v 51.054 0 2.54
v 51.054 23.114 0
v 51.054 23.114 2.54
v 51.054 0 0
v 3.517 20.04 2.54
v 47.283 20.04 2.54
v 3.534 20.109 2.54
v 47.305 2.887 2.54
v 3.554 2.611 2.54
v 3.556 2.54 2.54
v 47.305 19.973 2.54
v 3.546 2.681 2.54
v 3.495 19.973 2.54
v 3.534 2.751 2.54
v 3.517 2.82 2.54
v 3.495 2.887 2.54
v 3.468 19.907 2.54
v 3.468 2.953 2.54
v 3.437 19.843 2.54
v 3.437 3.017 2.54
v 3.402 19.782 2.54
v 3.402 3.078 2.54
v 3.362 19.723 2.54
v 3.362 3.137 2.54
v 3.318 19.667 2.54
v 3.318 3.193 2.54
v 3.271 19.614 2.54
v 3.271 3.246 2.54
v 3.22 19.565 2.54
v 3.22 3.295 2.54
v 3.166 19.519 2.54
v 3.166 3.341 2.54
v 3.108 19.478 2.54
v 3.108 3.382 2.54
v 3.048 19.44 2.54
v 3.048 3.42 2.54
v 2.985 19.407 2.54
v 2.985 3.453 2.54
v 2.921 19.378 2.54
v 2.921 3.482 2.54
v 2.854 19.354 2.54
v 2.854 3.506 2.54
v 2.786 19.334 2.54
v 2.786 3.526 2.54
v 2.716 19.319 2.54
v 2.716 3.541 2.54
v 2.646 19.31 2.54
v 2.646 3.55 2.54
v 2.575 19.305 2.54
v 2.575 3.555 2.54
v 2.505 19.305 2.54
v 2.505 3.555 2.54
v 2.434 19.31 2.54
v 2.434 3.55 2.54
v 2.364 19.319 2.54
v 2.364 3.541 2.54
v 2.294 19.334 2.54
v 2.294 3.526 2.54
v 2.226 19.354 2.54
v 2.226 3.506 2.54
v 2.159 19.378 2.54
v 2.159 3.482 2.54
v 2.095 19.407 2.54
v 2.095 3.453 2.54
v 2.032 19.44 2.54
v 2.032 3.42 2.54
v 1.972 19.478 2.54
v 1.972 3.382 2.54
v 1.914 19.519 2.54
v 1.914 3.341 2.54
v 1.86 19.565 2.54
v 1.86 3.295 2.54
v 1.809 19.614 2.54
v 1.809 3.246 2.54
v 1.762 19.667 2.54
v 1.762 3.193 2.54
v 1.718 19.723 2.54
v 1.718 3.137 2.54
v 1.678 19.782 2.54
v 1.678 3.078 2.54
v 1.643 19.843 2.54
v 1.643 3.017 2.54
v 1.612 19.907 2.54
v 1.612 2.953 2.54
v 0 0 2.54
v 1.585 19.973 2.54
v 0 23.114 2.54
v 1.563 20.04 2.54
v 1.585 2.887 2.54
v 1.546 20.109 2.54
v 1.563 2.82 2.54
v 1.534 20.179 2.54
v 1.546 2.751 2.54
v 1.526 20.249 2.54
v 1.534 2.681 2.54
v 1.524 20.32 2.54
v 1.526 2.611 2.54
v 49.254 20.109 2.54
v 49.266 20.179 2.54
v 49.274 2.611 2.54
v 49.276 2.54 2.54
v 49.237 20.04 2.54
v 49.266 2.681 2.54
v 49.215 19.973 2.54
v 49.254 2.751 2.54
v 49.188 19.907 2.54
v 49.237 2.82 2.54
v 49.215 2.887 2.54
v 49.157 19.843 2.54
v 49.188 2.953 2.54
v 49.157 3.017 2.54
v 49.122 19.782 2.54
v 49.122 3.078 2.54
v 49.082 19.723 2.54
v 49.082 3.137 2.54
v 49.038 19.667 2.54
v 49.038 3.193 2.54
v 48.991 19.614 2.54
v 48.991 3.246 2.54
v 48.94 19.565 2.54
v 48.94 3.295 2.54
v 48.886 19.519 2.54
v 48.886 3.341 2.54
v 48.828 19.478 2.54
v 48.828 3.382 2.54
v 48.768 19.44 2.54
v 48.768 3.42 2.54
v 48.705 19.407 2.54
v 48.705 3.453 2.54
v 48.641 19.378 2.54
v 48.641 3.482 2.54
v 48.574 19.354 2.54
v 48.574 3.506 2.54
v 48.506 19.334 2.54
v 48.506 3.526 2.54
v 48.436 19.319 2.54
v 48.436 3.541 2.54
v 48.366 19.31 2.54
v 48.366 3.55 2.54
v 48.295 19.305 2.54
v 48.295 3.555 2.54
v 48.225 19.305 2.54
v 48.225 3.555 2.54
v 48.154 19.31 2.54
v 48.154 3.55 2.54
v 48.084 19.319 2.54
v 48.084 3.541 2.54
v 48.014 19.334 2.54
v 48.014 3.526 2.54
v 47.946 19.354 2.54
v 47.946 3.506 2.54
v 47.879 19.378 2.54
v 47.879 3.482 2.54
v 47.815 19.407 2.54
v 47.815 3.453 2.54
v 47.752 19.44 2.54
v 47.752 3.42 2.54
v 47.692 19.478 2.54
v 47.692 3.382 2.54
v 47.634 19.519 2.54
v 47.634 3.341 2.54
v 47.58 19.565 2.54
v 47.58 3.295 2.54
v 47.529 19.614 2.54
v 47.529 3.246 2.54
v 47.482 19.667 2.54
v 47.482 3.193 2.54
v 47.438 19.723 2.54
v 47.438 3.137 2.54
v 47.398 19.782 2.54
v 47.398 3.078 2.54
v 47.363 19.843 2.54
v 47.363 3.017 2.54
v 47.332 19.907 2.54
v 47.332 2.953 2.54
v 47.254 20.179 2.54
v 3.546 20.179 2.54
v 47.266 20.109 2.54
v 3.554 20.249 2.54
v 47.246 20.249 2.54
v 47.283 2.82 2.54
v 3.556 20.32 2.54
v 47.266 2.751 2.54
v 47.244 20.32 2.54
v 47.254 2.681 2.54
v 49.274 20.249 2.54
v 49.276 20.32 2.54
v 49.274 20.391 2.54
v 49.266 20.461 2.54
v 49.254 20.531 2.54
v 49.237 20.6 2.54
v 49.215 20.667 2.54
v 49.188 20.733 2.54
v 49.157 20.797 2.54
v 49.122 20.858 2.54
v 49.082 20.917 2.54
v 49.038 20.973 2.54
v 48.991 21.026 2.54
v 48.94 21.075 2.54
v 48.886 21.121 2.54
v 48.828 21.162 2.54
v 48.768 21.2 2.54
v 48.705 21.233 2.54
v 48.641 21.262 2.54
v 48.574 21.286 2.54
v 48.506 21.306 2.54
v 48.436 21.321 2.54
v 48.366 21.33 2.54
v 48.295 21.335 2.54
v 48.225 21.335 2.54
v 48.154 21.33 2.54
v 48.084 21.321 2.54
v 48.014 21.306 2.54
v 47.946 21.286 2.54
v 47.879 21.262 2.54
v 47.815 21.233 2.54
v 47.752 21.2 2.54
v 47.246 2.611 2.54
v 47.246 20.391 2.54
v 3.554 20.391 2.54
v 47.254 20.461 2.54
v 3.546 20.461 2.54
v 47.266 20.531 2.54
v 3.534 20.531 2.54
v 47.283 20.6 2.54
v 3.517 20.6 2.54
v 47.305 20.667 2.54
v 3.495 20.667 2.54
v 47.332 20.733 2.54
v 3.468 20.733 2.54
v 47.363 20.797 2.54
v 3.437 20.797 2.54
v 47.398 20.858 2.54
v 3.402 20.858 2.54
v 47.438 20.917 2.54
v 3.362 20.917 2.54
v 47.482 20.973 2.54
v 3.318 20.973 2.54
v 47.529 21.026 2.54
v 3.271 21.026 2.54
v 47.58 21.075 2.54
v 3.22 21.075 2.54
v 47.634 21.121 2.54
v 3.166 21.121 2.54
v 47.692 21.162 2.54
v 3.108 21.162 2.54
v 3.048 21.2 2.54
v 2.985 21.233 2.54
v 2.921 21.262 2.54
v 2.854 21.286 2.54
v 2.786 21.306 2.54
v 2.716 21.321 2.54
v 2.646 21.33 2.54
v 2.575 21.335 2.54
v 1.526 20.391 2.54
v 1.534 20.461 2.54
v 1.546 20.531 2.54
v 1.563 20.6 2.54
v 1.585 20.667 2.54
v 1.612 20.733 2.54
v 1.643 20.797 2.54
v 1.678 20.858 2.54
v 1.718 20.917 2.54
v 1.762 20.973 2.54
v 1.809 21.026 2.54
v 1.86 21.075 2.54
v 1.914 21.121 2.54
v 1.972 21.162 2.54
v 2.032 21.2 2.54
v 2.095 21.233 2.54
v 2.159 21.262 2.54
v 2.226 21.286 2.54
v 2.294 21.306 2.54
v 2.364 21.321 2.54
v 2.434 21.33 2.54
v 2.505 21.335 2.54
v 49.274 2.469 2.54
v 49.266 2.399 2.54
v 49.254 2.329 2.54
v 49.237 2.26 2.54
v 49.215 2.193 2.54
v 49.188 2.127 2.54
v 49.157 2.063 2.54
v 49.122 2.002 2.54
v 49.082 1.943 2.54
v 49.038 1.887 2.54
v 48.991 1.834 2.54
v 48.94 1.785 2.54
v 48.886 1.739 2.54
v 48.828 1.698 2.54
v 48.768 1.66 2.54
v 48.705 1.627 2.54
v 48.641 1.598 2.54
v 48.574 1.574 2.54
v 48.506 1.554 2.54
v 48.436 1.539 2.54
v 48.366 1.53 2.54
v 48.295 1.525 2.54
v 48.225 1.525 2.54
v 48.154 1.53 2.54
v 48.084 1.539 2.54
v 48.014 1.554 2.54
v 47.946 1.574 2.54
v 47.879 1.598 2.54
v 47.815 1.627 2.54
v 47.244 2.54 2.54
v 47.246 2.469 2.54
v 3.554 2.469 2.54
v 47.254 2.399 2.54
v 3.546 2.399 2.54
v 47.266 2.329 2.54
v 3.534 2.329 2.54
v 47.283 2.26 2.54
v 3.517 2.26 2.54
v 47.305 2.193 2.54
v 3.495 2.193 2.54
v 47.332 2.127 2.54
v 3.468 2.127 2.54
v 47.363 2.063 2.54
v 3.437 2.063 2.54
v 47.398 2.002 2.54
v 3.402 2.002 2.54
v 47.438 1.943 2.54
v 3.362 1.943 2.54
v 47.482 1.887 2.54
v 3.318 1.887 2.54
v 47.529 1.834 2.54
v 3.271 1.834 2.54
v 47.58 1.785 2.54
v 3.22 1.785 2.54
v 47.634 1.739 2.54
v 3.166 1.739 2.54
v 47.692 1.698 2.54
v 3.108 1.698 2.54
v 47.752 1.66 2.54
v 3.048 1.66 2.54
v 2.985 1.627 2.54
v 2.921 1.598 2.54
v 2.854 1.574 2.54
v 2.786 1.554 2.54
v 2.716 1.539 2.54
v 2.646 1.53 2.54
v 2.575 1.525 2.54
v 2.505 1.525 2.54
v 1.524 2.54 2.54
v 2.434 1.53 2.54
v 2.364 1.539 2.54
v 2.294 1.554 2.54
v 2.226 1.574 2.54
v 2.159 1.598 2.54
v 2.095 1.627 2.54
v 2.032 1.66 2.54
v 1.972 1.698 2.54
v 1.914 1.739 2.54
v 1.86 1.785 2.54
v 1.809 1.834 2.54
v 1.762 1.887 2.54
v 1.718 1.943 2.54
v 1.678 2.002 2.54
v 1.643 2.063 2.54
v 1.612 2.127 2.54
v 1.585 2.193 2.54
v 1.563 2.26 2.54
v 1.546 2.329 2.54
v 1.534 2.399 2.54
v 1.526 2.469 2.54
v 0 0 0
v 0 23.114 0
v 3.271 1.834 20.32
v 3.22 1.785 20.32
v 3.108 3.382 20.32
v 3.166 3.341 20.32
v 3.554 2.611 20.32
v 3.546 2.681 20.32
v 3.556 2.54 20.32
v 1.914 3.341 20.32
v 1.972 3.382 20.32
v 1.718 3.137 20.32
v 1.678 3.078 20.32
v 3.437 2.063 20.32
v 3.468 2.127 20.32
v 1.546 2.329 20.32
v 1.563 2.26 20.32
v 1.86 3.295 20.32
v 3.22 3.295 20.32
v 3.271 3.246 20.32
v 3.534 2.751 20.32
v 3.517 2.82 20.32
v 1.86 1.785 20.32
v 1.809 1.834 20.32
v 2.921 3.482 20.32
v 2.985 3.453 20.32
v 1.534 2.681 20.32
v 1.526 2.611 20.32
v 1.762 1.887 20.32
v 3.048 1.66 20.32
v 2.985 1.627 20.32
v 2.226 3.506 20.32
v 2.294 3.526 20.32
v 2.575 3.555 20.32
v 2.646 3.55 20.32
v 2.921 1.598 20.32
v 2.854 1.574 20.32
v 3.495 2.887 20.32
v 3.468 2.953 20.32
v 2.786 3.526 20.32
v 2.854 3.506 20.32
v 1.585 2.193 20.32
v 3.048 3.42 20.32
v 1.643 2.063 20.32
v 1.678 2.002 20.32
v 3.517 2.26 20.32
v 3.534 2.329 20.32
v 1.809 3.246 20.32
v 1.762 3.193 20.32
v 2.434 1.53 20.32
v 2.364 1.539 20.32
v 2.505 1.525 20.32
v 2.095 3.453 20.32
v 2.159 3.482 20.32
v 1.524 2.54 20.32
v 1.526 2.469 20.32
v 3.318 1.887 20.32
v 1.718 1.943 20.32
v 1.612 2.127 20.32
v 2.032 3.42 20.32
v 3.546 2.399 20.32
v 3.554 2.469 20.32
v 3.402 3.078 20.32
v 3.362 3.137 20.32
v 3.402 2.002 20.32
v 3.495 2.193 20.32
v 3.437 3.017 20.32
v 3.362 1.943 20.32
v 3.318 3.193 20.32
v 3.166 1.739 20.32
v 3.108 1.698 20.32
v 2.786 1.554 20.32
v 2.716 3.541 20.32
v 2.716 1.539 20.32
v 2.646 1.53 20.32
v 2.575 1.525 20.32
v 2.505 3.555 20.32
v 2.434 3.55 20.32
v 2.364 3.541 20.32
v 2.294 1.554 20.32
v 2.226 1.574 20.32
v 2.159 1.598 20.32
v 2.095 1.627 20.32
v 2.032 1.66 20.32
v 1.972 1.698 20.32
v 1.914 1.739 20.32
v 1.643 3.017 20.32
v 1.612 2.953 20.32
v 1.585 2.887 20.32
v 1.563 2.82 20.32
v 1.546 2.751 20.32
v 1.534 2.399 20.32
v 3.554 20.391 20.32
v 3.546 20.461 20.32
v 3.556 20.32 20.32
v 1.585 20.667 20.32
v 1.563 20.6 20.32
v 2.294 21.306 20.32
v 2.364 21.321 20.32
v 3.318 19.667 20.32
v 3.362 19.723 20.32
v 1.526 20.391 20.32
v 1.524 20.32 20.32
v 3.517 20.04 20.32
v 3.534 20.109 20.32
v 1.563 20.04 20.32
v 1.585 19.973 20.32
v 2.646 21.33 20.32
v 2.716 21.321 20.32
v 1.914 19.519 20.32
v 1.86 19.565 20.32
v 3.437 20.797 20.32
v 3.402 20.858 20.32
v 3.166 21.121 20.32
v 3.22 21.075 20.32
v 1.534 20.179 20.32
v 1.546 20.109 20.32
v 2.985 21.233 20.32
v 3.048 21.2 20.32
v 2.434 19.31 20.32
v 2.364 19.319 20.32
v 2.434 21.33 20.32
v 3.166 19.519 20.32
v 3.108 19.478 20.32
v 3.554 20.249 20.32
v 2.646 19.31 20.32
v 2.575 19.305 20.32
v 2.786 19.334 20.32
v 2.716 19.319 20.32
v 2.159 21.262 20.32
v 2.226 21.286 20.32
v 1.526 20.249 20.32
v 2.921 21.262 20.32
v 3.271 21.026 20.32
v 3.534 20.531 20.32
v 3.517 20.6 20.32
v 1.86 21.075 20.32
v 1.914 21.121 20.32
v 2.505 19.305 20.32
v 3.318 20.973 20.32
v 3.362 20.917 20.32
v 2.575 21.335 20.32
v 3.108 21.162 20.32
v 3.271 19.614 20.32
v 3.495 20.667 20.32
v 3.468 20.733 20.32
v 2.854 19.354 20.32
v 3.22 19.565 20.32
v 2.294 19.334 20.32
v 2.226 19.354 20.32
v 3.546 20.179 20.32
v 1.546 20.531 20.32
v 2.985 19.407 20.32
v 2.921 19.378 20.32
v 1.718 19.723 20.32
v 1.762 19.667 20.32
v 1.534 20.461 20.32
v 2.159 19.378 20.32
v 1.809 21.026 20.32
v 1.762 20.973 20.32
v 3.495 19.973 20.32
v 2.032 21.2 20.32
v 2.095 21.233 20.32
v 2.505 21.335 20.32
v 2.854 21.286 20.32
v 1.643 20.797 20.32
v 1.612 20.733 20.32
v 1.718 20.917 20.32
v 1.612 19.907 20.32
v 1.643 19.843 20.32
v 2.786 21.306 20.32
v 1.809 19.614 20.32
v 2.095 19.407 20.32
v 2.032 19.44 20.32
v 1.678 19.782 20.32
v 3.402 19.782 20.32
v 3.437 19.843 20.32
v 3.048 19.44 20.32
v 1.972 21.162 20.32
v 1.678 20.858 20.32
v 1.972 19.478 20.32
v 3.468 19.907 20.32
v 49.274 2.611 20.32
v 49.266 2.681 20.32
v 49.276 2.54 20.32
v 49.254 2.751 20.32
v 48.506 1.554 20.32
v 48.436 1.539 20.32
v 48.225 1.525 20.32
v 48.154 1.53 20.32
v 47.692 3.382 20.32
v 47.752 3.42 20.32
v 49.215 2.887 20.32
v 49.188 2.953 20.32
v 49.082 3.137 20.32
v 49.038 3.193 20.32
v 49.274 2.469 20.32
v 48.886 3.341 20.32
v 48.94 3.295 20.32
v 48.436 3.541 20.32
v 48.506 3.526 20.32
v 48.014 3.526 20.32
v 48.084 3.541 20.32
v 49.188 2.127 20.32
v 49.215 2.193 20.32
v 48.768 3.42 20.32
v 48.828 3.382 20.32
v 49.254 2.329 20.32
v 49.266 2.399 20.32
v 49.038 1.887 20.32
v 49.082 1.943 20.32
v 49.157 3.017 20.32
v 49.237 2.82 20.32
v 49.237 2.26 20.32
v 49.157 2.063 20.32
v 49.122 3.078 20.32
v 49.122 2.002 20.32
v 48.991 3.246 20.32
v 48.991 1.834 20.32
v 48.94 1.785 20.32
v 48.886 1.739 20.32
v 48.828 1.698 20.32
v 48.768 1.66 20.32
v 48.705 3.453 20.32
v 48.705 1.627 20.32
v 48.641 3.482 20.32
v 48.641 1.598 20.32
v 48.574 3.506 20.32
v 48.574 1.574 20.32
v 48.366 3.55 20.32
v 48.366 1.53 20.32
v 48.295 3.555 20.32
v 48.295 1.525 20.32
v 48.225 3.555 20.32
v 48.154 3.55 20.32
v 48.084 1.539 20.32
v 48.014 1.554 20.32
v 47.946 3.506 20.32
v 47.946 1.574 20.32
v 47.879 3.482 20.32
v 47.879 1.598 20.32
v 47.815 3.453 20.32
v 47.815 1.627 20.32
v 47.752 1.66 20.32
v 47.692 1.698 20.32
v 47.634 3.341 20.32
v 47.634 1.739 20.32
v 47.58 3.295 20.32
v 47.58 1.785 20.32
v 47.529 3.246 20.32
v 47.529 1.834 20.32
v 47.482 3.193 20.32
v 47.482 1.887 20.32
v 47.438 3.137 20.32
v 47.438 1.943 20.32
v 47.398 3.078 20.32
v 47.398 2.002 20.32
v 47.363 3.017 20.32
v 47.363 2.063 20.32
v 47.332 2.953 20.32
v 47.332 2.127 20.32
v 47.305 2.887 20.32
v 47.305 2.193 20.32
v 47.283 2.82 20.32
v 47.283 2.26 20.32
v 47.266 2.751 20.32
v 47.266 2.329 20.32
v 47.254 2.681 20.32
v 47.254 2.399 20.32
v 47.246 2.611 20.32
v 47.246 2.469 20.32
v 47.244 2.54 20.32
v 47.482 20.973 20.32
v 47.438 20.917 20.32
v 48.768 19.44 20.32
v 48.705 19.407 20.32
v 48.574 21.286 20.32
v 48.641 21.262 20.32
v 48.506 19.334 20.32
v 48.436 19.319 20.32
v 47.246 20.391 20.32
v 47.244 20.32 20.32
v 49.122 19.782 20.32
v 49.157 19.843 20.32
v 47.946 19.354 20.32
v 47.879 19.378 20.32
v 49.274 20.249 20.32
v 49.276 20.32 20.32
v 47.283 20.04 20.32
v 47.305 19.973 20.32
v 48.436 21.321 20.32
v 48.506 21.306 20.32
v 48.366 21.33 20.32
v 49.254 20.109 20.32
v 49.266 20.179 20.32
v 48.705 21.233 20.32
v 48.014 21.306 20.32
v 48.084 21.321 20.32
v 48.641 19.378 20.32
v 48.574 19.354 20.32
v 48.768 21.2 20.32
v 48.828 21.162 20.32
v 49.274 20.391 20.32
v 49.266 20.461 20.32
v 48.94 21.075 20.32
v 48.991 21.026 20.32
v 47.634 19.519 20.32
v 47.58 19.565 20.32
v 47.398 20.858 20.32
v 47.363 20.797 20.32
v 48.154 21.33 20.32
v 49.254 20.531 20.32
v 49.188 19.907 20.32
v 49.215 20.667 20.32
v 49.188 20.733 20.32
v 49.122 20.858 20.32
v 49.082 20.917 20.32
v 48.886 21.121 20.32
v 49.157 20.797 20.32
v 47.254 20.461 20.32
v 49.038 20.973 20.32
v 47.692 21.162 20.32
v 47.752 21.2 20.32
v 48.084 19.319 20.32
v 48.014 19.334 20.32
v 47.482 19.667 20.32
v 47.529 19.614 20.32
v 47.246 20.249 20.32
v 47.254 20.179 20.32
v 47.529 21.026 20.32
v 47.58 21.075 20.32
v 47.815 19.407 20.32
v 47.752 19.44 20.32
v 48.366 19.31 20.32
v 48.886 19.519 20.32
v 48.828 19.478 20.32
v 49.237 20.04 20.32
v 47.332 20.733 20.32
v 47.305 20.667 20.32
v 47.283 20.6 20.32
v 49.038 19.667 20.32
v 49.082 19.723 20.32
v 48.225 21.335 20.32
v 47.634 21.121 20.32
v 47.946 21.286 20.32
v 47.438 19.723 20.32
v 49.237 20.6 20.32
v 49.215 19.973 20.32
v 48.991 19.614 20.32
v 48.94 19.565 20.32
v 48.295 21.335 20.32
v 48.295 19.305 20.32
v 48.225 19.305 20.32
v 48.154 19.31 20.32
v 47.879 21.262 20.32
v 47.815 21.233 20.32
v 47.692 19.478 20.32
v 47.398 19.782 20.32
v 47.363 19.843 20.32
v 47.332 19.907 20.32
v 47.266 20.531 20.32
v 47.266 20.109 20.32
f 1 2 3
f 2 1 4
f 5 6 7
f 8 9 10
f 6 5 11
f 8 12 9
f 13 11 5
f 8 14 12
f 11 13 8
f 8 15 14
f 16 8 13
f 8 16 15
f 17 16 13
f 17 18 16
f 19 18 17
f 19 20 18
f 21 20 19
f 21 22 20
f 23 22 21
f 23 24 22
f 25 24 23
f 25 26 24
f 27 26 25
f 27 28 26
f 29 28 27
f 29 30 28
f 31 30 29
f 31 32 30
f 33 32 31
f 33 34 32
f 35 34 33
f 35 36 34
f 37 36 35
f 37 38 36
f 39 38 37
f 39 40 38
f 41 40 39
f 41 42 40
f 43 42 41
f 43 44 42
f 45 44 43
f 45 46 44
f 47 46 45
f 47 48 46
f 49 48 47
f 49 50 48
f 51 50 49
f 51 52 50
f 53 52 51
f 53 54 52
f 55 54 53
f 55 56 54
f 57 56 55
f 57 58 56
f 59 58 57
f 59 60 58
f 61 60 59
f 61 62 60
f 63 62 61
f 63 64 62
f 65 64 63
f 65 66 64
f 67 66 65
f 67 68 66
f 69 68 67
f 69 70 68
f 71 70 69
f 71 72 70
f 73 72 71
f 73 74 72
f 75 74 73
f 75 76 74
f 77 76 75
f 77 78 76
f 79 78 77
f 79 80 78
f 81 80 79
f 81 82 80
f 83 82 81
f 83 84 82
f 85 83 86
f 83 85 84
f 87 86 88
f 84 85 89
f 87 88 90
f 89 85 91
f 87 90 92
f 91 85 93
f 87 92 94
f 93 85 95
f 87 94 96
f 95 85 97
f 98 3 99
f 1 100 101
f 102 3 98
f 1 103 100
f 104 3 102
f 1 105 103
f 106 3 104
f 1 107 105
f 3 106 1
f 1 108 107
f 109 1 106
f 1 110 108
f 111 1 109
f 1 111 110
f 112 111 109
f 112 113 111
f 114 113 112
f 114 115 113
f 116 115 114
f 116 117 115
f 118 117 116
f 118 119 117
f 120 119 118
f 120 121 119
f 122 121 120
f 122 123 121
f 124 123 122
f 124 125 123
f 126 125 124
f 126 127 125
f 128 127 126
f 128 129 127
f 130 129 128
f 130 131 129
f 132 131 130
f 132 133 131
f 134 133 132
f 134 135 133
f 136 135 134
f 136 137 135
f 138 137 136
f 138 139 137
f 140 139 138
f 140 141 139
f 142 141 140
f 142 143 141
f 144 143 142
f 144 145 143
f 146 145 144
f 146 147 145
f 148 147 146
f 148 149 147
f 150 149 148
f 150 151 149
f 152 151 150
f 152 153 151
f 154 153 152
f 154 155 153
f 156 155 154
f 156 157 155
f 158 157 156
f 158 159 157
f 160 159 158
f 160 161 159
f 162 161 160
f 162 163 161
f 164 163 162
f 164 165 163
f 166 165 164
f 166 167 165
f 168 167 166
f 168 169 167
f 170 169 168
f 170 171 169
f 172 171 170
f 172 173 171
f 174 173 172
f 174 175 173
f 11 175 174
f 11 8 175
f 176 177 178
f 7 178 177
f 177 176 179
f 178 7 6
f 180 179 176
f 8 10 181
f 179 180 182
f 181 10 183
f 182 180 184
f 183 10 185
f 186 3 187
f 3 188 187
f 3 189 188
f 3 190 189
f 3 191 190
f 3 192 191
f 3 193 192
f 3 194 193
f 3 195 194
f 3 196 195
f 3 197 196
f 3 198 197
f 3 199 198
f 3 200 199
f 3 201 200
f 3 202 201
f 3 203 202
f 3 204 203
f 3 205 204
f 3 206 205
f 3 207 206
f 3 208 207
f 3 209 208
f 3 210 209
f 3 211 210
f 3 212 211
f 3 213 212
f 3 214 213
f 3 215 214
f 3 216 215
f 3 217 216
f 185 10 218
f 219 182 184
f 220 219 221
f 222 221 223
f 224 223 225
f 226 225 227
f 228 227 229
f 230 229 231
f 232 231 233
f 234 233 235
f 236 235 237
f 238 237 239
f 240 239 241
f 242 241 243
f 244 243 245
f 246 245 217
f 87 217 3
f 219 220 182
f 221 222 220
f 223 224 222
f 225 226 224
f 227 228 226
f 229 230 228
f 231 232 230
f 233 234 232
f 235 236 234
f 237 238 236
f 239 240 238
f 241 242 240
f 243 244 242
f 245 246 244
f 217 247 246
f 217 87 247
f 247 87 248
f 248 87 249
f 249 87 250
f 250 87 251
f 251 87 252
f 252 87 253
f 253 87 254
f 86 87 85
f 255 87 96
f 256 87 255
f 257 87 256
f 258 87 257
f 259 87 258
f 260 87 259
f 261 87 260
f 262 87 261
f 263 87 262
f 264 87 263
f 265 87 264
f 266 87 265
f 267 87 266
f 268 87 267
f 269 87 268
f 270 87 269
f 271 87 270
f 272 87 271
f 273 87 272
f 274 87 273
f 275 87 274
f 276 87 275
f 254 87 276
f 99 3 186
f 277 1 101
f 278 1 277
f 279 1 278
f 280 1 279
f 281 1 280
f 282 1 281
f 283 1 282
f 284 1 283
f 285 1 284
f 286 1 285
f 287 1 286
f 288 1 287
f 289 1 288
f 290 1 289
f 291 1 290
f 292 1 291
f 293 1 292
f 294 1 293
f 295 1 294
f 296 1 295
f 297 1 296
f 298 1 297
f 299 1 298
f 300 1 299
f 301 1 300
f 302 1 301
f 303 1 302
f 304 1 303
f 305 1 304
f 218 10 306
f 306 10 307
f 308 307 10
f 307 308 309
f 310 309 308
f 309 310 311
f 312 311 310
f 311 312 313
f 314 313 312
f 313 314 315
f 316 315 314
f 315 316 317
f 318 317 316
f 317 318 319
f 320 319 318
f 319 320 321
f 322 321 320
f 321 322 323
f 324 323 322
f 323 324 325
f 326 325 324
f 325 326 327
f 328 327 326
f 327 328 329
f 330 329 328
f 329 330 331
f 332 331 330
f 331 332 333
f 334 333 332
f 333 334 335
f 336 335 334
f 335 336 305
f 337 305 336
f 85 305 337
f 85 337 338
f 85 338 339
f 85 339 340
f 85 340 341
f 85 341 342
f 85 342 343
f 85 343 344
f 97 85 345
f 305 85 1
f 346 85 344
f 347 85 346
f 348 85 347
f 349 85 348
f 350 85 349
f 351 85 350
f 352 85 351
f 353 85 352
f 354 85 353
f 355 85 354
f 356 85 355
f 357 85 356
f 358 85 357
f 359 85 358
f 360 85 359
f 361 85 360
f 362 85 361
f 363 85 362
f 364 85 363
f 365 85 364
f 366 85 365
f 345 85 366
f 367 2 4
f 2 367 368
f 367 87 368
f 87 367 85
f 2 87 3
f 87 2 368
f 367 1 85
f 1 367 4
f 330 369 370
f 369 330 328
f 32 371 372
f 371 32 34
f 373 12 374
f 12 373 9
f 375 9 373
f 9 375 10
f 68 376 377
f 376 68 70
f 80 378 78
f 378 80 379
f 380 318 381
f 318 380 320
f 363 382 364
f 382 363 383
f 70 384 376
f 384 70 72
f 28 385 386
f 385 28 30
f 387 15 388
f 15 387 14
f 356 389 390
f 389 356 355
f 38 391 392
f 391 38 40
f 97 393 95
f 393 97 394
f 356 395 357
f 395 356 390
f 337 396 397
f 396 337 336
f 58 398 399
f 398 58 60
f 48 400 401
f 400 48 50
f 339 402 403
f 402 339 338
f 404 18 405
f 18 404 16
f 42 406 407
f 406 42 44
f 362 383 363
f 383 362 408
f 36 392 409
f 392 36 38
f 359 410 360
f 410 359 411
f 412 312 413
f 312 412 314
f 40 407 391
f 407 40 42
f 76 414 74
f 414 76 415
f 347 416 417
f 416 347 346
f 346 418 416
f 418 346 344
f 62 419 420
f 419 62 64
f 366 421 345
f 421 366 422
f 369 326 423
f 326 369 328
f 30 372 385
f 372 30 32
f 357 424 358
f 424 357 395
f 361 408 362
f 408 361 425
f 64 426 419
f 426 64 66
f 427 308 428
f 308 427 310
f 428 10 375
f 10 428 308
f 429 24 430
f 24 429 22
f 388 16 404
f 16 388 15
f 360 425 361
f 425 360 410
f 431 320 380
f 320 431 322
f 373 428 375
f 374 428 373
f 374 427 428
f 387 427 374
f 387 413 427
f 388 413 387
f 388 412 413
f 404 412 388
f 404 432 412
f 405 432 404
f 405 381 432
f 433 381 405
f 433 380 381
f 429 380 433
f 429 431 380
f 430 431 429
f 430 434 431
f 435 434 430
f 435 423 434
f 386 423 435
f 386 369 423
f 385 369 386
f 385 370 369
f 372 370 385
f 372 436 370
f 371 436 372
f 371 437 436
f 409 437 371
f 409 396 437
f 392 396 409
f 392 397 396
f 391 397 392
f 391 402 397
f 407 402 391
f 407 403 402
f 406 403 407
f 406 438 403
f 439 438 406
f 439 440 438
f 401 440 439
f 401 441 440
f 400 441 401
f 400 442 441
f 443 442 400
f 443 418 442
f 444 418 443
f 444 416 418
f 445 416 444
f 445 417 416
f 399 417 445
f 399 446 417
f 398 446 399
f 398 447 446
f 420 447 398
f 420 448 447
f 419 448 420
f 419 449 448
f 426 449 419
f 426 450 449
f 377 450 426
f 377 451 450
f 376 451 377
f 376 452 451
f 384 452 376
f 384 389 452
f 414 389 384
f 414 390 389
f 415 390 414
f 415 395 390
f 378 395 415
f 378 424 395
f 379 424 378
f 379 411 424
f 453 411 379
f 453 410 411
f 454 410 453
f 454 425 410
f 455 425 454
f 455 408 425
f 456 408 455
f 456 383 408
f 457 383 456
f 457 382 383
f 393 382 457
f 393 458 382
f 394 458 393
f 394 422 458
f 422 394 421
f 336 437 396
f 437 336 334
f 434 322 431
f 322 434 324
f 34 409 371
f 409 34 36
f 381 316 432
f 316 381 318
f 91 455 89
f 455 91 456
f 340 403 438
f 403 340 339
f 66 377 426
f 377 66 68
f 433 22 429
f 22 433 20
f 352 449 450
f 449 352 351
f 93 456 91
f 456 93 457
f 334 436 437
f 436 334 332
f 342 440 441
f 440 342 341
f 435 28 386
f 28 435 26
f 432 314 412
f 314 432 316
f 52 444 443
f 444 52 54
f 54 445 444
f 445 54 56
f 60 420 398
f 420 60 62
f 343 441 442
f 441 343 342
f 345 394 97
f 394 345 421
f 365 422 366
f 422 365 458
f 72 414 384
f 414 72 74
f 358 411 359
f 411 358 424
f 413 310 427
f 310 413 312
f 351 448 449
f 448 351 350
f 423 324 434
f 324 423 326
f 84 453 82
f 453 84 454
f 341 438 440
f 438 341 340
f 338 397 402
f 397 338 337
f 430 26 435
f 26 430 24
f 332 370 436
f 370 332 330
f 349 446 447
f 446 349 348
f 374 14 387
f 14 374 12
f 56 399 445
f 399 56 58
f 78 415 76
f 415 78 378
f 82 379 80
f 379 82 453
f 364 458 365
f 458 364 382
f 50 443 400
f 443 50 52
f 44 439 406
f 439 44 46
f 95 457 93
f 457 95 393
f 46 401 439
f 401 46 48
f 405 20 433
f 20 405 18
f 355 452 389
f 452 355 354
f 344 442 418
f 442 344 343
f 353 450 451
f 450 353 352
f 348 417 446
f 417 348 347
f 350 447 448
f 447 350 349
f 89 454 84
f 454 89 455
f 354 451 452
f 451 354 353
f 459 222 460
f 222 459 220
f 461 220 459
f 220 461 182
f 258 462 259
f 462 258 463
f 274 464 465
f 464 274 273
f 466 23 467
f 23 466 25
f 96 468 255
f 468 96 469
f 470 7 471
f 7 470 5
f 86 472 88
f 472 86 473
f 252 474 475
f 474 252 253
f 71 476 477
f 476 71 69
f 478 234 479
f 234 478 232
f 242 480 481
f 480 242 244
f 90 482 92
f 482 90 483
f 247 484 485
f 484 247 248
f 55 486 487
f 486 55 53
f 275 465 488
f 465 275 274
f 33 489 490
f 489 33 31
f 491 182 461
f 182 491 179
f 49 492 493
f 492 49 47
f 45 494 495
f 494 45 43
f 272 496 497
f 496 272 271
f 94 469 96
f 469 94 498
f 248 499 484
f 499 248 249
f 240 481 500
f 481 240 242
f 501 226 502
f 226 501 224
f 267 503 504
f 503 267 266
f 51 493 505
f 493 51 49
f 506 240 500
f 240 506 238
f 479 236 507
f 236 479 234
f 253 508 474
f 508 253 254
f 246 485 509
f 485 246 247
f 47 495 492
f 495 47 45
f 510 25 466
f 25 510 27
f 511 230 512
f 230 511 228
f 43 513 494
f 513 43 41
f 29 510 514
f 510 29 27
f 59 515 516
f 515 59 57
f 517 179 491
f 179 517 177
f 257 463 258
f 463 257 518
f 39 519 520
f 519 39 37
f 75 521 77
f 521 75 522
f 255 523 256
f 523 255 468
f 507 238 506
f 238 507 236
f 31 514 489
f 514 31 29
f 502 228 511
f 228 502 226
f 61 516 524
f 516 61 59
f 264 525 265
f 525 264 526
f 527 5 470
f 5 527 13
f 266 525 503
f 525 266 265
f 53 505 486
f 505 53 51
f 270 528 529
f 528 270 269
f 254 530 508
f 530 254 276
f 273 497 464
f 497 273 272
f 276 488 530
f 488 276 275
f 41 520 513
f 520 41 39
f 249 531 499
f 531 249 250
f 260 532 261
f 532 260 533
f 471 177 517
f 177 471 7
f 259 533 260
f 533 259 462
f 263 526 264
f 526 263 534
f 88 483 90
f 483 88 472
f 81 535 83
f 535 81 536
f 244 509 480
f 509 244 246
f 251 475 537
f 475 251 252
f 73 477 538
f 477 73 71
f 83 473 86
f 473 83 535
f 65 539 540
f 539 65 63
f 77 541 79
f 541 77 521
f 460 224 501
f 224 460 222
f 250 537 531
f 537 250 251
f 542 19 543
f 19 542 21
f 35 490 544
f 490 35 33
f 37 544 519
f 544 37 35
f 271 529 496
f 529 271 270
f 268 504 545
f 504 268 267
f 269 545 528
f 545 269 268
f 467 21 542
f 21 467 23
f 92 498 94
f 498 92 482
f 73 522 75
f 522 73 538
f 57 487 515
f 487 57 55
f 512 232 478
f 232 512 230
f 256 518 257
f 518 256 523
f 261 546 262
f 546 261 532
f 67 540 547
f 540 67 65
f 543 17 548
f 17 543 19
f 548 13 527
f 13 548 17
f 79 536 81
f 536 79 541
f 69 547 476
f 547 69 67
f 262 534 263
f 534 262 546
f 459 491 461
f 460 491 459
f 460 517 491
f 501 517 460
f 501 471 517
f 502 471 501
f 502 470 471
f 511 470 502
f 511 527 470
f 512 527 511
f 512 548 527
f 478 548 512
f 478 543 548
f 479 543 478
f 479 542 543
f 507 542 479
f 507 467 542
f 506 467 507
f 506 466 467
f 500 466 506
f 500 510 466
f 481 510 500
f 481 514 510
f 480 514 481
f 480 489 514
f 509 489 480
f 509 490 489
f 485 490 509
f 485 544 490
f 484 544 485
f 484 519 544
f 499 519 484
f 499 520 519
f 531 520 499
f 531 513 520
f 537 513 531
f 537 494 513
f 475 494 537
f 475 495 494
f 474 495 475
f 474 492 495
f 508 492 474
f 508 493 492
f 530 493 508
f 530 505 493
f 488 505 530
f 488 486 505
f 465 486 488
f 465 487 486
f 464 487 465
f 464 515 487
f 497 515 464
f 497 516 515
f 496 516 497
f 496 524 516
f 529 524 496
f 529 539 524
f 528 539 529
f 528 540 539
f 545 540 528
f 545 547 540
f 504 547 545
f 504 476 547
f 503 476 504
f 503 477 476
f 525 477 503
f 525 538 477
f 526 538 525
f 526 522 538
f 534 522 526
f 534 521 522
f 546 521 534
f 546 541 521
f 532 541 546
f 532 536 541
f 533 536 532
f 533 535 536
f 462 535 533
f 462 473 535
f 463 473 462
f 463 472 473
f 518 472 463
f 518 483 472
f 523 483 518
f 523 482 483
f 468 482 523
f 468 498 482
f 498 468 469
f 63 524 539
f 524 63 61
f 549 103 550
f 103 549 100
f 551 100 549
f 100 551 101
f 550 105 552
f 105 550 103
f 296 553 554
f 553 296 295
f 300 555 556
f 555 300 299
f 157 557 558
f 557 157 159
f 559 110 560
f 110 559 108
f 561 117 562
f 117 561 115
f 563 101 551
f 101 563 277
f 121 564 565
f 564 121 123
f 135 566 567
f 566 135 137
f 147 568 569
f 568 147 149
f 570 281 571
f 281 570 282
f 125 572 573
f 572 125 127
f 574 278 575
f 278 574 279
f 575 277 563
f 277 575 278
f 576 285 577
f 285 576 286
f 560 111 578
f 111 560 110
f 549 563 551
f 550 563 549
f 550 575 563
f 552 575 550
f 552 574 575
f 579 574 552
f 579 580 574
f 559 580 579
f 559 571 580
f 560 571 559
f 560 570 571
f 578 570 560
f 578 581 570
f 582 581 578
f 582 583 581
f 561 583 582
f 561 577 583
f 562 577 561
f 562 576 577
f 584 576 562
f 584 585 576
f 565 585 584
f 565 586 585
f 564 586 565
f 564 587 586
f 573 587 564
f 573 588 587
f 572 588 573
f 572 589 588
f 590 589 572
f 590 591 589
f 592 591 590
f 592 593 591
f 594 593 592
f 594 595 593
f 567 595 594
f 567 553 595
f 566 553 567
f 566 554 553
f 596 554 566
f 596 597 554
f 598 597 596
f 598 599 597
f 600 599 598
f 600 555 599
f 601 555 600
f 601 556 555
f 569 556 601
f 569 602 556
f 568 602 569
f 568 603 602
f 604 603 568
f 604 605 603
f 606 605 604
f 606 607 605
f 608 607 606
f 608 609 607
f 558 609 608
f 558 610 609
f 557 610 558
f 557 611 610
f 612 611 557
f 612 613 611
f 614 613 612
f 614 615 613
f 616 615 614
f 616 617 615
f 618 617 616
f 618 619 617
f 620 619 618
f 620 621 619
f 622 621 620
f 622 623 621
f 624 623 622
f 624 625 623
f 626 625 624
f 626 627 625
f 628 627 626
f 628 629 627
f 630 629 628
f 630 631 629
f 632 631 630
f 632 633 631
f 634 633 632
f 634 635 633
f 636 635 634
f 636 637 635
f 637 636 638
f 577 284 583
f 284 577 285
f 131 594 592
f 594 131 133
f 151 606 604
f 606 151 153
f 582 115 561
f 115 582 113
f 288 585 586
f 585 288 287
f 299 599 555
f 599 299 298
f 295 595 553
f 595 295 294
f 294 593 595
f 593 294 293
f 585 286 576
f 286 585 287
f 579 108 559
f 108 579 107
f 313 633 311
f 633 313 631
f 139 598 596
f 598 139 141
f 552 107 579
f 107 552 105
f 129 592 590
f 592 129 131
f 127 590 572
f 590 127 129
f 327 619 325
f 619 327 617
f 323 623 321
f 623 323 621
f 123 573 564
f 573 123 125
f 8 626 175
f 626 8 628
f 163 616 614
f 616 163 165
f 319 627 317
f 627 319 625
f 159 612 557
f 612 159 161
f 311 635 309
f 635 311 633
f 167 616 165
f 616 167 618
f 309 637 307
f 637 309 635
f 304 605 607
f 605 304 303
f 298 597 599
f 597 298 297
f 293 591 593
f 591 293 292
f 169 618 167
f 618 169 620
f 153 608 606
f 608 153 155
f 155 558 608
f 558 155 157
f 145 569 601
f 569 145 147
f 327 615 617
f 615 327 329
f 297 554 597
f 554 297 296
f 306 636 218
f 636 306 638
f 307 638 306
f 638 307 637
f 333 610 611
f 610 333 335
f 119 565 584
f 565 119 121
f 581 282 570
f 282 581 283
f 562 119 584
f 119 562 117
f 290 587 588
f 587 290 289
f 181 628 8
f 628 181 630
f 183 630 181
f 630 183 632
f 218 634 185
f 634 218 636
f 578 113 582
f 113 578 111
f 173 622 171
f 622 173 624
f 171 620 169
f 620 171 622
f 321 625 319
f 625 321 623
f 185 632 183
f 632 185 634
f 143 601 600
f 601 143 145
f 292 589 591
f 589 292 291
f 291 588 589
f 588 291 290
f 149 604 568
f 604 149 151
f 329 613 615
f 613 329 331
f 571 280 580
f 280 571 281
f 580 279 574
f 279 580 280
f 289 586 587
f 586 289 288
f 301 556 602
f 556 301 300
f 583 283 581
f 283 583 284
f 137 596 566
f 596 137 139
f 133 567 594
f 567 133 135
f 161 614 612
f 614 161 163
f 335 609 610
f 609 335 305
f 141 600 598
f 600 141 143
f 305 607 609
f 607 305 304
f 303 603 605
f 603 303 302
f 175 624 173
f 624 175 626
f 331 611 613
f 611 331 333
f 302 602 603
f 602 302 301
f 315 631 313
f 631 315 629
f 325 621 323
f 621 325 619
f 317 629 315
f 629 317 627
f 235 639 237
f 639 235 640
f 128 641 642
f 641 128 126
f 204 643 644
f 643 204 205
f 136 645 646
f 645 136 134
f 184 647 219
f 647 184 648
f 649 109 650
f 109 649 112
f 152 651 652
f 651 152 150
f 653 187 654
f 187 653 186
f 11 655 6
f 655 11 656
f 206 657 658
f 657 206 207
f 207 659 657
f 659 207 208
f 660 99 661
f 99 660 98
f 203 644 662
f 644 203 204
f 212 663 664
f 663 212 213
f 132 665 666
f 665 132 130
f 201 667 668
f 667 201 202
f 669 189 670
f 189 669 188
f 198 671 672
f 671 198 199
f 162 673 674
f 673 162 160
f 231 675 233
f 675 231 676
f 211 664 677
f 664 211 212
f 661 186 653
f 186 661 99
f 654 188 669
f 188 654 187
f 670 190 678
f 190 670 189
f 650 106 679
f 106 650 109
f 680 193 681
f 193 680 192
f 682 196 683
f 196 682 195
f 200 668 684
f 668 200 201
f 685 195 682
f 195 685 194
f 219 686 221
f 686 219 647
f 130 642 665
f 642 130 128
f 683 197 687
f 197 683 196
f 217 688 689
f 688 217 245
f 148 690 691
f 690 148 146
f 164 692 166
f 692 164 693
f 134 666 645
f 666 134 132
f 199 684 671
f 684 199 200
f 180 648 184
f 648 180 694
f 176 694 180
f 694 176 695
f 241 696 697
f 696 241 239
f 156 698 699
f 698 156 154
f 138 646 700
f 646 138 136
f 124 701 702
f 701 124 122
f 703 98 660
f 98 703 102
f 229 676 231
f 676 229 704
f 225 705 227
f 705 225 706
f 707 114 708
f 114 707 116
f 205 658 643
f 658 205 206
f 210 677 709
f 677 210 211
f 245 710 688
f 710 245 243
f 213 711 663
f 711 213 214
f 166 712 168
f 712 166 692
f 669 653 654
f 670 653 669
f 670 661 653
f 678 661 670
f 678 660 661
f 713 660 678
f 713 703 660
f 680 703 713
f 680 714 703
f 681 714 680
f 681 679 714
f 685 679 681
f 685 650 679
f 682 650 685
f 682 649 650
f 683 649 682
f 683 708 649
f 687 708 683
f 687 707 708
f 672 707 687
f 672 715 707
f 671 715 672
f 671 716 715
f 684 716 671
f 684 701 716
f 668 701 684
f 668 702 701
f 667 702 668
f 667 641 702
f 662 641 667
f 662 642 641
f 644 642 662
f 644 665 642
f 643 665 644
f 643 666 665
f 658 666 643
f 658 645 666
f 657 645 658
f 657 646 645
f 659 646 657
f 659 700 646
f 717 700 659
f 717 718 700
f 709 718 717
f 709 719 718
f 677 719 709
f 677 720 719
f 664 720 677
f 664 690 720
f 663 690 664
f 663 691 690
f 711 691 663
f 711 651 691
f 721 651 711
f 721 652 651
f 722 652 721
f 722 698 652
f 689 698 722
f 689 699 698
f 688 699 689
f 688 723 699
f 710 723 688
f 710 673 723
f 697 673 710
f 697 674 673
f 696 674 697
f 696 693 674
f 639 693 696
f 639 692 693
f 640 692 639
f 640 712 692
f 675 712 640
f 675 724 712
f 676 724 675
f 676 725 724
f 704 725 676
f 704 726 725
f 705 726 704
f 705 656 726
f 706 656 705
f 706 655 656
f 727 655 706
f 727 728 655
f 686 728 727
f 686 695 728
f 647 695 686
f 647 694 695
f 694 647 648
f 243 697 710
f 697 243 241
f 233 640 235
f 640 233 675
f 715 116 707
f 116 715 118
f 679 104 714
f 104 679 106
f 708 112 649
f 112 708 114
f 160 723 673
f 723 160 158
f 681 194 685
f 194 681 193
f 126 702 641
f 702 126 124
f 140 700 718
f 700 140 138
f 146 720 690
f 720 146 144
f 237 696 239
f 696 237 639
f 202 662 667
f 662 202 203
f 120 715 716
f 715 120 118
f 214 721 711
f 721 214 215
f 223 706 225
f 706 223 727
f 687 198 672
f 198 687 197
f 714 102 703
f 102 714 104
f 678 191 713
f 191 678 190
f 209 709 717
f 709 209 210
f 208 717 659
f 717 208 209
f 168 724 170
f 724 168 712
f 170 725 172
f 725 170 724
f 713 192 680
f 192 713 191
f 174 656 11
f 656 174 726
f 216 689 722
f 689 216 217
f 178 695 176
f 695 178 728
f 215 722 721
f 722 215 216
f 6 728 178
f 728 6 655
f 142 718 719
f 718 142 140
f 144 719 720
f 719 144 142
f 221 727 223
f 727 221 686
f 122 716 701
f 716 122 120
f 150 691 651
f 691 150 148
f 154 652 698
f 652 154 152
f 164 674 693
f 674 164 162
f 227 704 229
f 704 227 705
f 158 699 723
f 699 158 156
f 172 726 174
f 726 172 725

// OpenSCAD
in = 25.4; // Conv. to inches

board_width = 2 * in;
board_depth = 0.9 * in;
hole_rad = 0.05 * in;
hole_dist_edge = 0.1 * in;
hole_sep_depth = 0.7 * in;
hole_sep_width = 1.8 * in;

shell_thickness = 0.1 * in;
shell_gap = 0.01 * in;
peg_len = 0.8 * in;
peg_gap = 0.01 * in;

module peg(x,y,z) {
    translate([x,y,z]) {
        cylinder(
            h = peg_len,
            r = hole_rad - peg_gap,
            $fn = 90
        );
    }
}

union() {
    cube([
        board_width + shell_gap,
        board_depth + shell_gap,
        shell_thickness
    ]);

    peg(
        hole_dist_edge,
        hole_dist_edge,
        0
    );

    peg(
        hole_dist_edge,
        hole_dist_edge + hole_sep_depth,
        0
    );

    peg(
        hole_dist_edge + hole_sep_width,
        hole_dist_edge,
        0
    );

    peg(
        hole_dist_edge + hole_sep_width,
        hole_dist_edge + hole_sep_depth,
        0
    );
}
